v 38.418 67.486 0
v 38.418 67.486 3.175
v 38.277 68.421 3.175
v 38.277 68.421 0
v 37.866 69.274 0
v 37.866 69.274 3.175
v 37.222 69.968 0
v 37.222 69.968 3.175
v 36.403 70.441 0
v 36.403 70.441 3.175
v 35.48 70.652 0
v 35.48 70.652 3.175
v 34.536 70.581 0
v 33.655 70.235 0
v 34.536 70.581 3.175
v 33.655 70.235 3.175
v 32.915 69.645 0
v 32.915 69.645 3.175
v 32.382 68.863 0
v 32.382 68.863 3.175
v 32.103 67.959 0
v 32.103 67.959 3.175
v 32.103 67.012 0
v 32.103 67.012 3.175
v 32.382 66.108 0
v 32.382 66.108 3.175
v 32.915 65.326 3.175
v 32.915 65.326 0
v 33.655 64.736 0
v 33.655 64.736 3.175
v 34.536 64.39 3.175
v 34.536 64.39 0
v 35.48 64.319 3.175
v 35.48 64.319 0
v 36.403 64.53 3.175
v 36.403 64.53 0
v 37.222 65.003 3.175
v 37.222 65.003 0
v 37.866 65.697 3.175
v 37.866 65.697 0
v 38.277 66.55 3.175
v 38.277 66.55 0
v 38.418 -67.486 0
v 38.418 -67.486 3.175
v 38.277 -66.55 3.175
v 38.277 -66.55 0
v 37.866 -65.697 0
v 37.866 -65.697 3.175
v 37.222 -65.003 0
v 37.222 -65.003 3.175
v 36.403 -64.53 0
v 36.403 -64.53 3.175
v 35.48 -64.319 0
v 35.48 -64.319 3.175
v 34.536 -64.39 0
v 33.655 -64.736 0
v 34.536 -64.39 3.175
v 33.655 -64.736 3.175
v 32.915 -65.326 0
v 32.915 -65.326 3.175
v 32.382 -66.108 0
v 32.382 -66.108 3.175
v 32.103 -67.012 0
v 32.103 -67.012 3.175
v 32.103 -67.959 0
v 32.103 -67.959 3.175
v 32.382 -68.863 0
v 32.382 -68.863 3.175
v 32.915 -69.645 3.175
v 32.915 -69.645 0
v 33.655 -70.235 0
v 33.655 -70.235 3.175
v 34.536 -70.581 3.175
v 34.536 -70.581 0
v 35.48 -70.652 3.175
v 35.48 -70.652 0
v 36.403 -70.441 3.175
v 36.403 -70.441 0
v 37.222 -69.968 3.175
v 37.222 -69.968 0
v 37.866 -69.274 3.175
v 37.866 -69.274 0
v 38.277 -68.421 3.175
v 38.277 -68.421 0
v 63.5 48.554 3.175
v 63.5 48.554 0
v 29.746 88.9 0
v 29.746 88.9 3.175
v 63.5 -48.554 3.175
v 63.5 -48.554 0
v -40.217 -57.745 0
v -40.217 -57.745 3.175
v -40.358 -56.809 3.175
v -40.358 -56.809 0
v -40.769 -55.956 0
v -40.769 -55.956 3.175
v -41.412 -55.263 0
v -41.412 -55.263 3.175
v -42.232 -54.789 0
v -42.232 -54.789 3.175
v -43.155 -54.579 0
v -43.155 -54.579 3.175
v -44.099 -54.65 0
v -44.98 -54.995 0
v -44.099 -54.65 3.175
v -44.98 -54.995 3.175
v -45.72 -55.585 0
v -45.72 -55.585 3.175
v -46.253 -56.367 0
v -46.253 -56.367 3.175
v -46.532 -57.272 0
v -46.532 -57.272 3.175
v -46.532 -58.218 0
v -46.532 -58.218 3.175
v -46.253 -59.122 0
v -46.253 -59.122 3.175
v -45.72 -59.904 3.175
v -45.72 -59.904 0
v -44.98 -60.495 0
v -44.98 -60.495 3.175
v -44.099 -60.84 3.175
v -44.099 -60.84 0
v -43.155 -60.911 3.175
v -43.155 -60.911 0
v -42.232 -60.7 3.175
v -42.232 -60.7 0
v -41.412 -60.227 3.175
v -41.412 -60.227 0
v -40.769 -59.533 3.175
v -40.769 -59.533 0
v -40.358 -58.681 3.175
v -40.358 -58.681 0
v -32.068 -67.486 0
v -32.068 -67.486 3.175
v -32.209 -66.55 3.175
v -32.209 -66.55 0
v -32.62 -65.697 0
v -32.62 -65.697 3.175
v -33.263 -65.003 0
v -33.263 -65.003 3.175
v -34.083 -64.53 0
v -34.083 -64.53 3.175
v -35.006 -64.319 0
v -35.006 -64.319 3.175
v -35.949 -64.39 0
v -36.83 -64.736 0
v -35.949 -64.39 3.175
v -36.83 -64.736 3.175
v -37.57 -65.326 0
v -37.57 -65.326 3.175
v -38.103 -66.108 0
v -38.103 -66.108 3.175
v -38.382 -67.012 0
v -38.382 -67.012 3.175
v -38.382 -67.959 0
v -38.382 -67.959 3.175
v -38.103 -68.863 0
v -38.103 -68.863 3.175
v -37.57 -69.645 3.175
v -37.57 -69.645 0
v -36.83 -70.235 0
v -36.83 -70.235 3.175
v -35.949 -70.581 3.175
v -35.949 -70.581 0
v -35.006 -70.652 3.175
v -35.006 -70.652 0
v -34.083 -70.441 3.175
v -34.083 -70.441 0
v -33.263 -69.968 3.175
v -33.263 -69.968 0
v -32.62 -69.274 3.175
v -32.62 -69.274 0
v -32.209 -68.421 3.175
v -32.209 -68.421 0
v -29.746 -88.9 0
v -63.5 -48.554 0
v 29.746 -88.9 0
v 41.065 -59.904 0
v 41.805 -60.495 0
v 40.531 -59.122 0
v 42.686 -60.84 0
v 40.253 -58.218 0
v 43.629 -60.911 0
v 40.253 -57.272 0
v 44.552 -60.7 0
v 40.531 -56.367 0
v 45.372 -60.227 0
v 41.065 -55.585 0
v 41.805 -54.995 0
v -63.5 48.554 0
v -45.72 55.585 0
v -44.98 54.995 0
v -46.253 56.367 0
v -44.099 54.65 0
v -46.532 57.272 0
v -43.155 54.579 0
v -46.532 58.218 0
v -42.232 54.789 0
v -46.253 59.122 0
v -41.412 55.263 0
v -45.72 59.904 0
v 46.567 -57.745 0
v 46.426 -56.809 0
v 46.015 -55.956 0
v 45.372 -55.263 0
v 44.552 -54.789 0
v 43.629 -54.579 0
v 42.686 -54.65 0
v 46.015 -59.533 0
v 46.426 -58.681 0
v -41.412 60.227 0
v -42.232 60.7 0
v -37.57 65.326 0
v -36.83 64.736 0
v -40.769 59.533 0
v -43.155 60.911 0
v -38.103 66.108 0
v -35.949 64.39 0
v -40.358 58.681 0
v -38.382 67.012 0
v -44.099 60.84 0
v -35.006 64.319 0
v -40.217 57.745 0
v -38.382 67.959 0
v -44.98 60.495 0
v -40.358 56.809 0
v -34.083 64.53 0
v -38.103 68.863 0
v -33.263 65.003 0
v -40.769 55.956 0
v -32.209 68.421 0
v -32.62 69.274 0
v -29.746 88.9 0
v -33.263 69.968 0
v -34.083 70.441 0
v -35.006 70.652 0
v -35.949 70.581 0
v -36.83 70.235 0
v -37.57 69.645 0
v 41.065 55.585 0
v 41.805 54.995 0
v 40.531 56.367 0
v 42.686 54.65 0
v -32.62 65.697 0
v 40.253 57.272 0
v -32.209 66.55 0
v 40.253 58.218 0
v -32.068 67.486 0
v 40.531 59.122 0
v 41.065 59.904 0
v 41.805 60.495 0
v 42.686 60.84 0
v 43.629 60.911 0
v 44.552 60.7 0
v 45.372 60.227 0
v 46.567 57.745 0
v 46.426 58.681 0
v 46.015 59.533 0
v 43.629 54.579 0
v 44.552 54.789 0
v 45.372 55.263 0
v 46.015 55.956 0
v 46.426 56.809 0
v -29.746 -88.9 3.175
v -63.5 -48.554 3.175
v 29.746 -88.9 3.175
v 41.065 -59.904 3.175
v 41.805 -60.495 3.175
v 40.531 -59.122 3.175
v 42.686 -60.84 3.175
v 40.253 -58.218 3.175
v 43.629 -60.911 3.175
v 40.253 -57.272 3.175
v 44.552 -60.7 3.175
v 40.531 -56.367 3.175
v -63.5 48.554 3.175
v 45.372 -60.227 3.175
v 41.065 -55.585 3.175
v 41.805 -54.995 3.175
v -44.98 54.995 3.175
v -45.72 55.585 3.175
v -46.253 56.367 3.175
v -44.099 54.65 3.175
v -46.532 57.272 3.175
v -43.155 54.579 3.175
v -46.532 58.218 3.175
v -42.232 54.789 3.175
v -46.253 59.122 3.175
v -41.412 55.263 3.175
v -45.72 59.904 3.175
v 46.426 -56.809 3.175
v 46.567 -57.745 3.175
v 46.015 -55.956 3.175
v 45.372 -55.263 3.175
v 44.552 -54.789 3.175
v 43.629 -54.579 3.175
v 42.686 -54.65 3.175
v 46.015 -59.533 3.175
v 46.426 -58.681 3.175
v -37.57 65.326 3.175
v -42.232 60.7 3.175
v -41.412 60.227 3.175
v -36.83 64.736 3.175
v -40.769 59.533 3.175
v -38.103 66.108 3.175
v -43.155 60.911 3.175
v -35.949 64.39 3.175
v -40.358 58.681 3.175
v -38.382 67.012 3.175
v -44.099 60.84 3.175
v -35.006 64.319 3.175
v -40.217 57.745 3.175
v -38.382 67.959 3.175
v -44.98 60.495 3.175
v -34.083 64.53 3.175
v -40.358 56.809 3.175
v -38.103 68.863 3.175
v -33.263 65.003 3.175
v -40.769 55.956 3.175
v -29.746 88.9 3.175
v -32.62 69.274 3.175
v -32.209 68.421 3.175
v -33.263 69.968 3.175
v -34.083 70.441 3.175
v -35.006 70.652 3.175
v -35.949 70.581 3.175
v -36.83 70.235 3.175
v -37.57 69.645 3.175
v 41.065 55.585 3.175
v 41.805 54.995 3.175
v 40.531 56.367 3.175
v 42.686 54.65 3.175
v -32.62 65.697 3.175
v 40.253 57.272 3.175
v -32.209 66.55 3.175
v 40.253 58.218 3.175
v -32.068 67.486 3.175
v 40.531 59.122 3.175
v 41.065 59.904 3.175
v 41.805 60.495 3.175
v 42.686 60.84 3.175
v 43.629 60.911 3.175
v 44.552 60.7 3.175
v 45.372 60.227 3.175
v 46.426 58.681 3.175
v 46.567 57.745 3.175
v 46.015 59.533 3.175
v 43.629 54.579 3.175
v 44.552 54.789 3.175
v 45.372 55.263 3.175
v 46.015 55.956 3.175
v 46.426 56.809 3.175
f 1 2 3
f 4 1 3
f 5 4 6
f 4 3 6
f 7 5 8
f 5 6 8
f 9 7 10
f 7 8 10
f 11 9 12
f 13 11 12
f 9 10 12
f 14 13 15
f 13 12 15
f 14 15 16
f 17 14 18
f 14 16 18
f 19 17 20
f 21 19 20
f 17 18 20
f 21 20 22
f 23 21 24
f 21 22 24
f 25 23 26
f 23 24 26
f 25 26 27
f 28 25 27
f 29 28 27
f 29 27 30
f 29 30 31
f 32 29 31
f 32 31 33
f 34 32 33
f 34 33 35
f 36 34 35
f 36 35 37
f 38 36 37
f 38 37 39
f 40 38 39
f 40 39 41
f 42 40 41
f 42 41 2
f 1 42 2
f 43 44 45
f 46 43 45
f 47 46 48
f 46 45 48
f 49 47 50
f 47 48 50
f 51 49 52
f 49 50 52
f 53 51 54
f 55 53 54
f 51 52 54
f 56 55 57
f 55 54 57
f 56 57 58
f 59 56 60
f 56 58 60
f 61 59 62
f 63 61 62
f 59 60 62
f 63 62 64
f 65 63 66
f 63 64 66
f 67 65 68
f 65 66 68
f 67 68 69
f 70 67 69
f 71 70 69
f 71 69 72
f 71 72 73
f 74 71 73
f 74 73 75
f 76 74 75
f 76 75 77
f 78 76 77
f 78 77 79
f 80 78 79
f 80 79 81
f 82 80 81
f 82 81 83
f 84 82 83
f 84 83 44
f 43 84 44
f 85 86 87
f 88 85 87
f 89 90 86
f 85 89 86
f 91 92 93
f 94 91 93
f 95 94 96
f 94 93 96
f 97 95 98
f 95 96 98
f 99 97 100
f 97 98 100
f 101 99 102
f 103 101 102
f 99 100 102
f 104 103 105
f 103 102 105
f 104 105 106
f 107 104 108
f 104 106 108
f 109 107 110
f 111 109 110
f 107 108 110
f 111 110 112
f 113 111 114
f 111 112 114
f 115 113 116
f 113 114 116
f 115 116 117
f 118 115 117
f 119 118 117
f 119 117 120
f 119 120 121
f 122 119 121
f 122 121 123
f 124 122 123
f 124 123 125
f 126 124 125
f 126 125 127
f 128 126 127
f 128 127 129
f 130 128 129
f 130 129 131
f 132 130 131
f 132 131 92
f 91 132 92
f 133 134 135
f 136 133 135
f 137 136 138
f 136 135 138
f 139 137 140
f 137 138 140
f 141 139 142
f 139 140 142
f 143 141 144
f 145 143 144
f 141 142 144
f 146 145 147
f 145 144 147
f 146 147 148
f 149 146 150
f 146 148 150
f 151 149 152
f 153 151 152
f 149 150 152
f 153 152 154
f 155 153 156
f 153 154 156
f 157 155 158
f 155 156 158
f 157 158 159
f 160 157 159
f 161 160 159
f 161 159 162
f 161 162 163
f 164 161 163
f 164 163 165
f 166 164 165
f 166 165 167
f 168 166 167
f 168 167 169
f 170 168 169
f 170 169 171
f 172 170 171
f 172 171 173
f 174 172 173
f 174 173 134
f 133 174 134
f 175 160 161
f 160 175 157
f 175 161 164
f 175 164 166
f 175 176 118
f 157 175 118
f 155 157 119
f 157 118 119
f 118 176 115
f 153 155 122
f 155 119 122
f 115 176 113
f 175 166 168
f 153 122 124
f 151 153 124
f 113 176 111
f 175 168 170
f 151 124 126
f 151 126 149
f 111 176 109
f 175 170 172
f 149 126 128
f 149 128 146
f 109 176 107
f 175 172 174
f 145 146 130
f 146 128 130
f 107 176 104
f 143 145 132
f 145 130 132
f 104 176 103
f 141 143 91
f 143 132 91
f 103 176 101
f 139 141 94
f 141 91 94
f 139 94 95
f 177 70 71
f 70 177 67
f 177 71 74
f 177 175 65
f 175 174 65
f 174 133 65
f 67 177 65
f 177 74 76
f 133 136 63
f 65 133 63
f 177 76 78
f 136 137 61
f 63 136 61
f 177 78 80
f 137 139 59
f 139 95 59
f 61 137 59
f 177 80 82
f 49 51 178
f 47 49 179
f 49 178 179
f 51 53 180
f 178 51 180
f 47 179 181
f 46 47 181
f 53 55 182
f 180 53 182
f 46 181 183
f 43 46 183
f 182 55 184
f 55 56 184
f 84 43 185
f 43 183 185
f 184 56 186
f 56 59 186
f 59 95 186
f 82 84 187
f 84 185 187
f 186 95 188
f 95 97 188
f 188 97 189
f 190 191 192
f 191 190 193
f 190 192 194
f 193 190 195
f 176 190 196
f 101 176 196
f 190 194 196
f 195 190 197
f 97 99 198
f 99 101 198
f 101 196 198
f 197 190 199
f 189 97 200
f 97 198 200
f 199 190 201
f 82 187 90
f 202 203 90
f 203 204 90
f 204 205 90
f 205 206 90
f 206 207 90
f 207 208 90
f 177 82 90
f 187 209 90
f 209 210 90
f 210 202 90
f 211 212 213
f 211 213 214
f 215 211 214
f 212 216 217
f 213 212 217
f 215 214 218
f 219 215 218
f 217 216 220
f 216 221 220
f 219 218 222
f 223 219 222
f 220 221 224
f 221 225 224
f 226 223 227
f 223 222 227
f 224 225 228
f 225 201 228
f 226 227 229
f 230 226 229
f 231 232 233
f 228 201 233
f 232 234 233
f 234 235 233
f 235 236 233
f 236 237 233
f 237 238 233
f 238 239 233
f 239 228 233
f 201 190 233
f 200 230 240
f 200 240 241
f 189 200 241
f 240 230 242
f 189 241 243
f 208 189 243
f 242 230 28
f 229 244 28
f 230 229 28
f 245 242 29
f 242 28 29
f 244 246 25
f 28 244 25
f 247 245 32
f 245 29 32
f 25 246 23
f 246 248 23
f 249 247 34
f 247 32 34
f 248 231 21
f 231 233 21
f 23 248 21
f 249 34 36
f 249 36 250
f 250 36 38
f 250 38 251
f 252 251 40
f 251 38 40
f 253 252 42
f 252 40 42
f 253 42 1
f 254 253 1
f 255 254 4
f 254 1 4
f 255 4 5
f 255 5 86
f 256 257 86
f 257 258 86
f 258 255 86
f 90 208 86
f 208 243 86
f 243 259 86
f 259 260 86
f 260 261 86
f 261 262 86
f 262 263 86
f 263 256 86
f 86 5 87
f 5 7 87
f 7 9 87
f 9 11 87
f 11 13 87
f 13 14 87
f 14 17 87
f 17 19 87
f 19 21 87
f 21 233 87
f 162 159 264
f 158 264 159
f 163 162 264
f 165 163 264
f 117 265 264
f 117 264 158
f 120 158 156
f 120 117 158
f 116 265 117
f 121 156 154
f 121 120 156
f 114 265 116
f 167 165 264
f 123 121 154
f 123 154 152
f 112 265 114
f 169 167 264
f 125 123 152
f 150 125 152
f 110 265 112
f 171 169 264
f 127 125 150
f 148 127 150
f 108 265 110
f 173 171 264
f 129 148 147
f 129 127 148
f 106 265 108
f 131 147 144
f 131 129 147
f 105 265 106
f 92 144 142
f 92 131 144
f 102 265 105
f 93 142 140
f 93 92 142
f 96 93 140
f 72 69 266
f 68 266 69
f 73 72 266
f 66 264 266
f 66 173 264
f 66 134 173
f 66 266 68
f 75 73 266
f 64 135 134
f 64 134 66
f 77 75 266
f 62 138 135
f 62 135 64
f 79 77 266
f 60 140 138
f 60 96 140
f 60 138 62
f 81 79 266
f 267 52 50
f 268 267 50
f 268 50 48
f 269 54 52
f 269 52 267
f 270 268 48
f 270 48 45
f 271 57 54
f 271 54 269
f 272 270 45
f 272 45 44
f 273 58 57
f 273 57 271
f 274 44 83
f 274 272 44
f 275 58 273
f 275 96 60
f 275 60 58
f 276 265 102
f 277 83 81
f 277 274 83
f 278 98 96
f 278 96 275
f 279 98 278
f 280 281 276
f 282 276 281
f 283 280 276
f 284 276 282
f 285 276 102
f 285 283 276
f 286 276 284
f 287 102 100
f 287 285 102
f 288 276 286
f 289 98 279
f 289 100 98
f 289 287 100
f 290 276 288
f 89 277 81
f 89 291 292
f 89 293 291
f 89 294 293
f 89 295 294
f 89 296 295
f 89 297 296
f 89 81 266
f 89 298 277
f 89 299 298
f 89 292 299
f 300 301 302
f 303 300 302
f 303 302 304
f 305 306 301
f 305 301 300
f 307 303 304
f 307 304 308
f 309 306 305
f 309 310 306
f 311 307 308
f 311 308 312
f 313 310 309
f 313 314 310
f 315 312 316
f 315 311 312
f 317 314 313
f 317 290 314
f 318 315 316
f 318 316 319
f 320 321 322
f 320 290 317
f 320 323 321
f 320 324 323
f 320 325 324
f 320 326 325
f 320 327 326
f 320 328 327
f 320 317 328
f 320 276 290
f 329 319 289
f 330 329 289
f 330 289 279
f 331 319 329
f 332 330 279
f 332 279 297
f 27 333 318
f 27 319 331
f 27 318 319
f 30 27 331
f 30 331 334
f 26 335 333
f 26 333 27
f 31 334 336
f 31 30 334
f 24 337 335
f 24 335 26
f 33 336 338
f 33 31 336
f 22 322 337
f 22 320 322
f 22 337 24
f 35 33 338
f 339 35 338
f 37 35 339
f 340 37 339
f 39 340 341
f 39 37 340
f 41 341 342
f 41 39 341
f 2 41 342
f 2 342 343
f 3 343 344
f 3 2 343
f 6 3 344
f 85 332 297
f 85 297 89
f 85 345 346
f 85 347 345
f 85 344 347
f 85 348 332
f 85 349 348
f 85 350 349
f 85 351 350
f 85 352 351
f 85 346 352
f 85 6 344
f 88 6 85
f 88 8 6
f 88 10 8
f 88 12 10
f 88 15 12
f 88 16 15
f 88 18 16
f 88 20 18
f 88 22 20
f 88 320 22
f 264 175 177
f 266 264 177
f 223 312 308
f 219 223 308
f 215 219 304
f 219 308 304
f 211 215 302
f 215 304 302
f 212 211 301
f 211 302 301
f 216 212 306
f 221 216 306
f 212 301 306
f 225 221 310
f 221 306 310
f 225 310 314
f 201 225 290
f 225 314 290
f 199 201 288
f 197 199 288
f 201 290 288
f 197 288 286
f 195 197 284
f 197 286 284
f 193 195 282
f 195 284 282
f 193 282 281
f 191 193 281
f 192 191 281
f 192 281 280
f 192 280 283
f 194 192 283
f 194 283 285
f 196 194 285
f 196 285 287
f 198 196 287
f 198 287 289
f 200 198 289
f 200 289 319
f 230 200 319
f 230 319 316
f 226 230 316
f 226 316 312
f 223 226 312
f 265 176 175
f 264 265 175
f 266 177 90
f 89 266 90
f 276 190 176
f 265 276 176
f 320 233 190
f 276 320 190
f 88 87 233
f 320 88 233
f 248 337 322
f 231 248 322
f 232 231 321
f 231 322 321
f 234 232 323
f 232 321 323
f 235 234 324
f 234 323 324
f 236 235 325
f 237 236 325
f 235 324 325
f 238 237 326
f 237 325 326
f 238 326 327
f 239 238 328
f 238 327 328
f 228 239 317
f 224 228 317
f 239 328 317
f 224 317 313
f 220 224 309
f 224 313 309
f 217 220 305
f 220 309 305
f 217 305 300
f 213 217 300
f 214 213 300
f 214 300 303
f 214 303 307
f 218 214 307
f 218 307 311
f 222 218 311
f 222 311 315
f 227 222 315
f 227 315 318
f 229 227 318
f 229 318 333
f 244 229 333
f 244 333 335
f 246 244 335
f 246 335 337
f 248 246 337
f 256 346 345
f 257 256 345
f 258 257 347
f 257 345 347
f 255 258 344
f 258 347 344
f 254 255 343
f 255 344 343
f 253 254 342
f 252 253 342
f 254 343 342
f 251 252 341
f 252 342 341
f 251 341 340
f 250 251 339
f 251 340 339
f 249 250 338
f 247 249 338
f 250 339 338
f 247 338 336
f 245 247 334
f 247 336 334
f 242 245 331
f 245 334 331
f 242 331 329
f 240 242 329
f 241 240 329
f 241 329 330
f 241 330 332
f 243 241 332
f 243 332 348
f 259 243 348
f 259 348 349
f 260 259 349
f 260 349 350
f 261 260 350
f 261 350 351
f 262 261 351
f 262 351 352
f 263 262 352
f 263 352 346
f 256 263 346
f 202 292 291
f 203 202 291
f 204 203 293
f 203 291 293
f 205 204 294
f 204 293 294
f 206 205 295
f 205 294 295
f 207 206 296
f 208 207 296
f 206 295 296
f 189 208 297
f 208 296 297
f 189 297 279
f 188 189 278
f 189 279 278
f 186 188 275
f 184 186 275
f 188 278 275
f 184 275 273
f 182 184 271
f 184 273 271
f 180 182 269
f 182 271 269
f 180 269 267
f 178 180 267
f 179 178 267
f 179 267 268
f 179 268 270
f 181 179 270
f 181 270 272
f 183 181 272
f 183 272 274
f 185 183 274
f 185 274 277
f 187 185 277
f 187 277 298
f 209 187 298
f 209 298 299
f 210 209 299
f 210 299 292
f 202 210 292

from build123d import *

# Parameters (mm, degrees)
F1_DEPTH = 3.175
F2_R     = 3.175
F3_DEPTH = 25.4


with BuildPart() as f1:
    # F0 (on Top) → F1 (new body)
    with BuildSketch(Plane.XY):
        Polygon((29.745836, 88.9), (-29.745836, 88.9), (-63.5, 48.554318), (-63.5, -48.554318), (-29.745836, -88.9), (29.745836, -88.9), (63.5, -48.554318), (63.5, 48.554318), align=None)
    extrude(amount=F1_DEPTH)

    # F2 (on face) → F3 (cut)
    with BuildSketch(Plane.XY.offset(3.175)):
        with Locations((-43.392069, 57.744911)):
            Circle(F2_R)
        with Locations((-35.242826, 67.48554)):
            Circle(F2_R)
        with Locations((35.242824, 67.485542)):
            Circle(F2_R)
        with Locations((43.392067, 57.744913)):
            Circle(F2_R)
        with Locations((43.392069, -57.744911)):
            Circle(F2_R)
        with Locations((35.242826, -67.48554)):
            Circle(F2_R)
        with Locations((-35.242826, -67.48554)):
            Circle(F2_R)
        with Locations((-43.392069, -57.744911)):
            Circle(F2_R)
    extrude(amount=-F3_DEPTH, mode=Mode.SUBTRACT)


solid = f1.part
